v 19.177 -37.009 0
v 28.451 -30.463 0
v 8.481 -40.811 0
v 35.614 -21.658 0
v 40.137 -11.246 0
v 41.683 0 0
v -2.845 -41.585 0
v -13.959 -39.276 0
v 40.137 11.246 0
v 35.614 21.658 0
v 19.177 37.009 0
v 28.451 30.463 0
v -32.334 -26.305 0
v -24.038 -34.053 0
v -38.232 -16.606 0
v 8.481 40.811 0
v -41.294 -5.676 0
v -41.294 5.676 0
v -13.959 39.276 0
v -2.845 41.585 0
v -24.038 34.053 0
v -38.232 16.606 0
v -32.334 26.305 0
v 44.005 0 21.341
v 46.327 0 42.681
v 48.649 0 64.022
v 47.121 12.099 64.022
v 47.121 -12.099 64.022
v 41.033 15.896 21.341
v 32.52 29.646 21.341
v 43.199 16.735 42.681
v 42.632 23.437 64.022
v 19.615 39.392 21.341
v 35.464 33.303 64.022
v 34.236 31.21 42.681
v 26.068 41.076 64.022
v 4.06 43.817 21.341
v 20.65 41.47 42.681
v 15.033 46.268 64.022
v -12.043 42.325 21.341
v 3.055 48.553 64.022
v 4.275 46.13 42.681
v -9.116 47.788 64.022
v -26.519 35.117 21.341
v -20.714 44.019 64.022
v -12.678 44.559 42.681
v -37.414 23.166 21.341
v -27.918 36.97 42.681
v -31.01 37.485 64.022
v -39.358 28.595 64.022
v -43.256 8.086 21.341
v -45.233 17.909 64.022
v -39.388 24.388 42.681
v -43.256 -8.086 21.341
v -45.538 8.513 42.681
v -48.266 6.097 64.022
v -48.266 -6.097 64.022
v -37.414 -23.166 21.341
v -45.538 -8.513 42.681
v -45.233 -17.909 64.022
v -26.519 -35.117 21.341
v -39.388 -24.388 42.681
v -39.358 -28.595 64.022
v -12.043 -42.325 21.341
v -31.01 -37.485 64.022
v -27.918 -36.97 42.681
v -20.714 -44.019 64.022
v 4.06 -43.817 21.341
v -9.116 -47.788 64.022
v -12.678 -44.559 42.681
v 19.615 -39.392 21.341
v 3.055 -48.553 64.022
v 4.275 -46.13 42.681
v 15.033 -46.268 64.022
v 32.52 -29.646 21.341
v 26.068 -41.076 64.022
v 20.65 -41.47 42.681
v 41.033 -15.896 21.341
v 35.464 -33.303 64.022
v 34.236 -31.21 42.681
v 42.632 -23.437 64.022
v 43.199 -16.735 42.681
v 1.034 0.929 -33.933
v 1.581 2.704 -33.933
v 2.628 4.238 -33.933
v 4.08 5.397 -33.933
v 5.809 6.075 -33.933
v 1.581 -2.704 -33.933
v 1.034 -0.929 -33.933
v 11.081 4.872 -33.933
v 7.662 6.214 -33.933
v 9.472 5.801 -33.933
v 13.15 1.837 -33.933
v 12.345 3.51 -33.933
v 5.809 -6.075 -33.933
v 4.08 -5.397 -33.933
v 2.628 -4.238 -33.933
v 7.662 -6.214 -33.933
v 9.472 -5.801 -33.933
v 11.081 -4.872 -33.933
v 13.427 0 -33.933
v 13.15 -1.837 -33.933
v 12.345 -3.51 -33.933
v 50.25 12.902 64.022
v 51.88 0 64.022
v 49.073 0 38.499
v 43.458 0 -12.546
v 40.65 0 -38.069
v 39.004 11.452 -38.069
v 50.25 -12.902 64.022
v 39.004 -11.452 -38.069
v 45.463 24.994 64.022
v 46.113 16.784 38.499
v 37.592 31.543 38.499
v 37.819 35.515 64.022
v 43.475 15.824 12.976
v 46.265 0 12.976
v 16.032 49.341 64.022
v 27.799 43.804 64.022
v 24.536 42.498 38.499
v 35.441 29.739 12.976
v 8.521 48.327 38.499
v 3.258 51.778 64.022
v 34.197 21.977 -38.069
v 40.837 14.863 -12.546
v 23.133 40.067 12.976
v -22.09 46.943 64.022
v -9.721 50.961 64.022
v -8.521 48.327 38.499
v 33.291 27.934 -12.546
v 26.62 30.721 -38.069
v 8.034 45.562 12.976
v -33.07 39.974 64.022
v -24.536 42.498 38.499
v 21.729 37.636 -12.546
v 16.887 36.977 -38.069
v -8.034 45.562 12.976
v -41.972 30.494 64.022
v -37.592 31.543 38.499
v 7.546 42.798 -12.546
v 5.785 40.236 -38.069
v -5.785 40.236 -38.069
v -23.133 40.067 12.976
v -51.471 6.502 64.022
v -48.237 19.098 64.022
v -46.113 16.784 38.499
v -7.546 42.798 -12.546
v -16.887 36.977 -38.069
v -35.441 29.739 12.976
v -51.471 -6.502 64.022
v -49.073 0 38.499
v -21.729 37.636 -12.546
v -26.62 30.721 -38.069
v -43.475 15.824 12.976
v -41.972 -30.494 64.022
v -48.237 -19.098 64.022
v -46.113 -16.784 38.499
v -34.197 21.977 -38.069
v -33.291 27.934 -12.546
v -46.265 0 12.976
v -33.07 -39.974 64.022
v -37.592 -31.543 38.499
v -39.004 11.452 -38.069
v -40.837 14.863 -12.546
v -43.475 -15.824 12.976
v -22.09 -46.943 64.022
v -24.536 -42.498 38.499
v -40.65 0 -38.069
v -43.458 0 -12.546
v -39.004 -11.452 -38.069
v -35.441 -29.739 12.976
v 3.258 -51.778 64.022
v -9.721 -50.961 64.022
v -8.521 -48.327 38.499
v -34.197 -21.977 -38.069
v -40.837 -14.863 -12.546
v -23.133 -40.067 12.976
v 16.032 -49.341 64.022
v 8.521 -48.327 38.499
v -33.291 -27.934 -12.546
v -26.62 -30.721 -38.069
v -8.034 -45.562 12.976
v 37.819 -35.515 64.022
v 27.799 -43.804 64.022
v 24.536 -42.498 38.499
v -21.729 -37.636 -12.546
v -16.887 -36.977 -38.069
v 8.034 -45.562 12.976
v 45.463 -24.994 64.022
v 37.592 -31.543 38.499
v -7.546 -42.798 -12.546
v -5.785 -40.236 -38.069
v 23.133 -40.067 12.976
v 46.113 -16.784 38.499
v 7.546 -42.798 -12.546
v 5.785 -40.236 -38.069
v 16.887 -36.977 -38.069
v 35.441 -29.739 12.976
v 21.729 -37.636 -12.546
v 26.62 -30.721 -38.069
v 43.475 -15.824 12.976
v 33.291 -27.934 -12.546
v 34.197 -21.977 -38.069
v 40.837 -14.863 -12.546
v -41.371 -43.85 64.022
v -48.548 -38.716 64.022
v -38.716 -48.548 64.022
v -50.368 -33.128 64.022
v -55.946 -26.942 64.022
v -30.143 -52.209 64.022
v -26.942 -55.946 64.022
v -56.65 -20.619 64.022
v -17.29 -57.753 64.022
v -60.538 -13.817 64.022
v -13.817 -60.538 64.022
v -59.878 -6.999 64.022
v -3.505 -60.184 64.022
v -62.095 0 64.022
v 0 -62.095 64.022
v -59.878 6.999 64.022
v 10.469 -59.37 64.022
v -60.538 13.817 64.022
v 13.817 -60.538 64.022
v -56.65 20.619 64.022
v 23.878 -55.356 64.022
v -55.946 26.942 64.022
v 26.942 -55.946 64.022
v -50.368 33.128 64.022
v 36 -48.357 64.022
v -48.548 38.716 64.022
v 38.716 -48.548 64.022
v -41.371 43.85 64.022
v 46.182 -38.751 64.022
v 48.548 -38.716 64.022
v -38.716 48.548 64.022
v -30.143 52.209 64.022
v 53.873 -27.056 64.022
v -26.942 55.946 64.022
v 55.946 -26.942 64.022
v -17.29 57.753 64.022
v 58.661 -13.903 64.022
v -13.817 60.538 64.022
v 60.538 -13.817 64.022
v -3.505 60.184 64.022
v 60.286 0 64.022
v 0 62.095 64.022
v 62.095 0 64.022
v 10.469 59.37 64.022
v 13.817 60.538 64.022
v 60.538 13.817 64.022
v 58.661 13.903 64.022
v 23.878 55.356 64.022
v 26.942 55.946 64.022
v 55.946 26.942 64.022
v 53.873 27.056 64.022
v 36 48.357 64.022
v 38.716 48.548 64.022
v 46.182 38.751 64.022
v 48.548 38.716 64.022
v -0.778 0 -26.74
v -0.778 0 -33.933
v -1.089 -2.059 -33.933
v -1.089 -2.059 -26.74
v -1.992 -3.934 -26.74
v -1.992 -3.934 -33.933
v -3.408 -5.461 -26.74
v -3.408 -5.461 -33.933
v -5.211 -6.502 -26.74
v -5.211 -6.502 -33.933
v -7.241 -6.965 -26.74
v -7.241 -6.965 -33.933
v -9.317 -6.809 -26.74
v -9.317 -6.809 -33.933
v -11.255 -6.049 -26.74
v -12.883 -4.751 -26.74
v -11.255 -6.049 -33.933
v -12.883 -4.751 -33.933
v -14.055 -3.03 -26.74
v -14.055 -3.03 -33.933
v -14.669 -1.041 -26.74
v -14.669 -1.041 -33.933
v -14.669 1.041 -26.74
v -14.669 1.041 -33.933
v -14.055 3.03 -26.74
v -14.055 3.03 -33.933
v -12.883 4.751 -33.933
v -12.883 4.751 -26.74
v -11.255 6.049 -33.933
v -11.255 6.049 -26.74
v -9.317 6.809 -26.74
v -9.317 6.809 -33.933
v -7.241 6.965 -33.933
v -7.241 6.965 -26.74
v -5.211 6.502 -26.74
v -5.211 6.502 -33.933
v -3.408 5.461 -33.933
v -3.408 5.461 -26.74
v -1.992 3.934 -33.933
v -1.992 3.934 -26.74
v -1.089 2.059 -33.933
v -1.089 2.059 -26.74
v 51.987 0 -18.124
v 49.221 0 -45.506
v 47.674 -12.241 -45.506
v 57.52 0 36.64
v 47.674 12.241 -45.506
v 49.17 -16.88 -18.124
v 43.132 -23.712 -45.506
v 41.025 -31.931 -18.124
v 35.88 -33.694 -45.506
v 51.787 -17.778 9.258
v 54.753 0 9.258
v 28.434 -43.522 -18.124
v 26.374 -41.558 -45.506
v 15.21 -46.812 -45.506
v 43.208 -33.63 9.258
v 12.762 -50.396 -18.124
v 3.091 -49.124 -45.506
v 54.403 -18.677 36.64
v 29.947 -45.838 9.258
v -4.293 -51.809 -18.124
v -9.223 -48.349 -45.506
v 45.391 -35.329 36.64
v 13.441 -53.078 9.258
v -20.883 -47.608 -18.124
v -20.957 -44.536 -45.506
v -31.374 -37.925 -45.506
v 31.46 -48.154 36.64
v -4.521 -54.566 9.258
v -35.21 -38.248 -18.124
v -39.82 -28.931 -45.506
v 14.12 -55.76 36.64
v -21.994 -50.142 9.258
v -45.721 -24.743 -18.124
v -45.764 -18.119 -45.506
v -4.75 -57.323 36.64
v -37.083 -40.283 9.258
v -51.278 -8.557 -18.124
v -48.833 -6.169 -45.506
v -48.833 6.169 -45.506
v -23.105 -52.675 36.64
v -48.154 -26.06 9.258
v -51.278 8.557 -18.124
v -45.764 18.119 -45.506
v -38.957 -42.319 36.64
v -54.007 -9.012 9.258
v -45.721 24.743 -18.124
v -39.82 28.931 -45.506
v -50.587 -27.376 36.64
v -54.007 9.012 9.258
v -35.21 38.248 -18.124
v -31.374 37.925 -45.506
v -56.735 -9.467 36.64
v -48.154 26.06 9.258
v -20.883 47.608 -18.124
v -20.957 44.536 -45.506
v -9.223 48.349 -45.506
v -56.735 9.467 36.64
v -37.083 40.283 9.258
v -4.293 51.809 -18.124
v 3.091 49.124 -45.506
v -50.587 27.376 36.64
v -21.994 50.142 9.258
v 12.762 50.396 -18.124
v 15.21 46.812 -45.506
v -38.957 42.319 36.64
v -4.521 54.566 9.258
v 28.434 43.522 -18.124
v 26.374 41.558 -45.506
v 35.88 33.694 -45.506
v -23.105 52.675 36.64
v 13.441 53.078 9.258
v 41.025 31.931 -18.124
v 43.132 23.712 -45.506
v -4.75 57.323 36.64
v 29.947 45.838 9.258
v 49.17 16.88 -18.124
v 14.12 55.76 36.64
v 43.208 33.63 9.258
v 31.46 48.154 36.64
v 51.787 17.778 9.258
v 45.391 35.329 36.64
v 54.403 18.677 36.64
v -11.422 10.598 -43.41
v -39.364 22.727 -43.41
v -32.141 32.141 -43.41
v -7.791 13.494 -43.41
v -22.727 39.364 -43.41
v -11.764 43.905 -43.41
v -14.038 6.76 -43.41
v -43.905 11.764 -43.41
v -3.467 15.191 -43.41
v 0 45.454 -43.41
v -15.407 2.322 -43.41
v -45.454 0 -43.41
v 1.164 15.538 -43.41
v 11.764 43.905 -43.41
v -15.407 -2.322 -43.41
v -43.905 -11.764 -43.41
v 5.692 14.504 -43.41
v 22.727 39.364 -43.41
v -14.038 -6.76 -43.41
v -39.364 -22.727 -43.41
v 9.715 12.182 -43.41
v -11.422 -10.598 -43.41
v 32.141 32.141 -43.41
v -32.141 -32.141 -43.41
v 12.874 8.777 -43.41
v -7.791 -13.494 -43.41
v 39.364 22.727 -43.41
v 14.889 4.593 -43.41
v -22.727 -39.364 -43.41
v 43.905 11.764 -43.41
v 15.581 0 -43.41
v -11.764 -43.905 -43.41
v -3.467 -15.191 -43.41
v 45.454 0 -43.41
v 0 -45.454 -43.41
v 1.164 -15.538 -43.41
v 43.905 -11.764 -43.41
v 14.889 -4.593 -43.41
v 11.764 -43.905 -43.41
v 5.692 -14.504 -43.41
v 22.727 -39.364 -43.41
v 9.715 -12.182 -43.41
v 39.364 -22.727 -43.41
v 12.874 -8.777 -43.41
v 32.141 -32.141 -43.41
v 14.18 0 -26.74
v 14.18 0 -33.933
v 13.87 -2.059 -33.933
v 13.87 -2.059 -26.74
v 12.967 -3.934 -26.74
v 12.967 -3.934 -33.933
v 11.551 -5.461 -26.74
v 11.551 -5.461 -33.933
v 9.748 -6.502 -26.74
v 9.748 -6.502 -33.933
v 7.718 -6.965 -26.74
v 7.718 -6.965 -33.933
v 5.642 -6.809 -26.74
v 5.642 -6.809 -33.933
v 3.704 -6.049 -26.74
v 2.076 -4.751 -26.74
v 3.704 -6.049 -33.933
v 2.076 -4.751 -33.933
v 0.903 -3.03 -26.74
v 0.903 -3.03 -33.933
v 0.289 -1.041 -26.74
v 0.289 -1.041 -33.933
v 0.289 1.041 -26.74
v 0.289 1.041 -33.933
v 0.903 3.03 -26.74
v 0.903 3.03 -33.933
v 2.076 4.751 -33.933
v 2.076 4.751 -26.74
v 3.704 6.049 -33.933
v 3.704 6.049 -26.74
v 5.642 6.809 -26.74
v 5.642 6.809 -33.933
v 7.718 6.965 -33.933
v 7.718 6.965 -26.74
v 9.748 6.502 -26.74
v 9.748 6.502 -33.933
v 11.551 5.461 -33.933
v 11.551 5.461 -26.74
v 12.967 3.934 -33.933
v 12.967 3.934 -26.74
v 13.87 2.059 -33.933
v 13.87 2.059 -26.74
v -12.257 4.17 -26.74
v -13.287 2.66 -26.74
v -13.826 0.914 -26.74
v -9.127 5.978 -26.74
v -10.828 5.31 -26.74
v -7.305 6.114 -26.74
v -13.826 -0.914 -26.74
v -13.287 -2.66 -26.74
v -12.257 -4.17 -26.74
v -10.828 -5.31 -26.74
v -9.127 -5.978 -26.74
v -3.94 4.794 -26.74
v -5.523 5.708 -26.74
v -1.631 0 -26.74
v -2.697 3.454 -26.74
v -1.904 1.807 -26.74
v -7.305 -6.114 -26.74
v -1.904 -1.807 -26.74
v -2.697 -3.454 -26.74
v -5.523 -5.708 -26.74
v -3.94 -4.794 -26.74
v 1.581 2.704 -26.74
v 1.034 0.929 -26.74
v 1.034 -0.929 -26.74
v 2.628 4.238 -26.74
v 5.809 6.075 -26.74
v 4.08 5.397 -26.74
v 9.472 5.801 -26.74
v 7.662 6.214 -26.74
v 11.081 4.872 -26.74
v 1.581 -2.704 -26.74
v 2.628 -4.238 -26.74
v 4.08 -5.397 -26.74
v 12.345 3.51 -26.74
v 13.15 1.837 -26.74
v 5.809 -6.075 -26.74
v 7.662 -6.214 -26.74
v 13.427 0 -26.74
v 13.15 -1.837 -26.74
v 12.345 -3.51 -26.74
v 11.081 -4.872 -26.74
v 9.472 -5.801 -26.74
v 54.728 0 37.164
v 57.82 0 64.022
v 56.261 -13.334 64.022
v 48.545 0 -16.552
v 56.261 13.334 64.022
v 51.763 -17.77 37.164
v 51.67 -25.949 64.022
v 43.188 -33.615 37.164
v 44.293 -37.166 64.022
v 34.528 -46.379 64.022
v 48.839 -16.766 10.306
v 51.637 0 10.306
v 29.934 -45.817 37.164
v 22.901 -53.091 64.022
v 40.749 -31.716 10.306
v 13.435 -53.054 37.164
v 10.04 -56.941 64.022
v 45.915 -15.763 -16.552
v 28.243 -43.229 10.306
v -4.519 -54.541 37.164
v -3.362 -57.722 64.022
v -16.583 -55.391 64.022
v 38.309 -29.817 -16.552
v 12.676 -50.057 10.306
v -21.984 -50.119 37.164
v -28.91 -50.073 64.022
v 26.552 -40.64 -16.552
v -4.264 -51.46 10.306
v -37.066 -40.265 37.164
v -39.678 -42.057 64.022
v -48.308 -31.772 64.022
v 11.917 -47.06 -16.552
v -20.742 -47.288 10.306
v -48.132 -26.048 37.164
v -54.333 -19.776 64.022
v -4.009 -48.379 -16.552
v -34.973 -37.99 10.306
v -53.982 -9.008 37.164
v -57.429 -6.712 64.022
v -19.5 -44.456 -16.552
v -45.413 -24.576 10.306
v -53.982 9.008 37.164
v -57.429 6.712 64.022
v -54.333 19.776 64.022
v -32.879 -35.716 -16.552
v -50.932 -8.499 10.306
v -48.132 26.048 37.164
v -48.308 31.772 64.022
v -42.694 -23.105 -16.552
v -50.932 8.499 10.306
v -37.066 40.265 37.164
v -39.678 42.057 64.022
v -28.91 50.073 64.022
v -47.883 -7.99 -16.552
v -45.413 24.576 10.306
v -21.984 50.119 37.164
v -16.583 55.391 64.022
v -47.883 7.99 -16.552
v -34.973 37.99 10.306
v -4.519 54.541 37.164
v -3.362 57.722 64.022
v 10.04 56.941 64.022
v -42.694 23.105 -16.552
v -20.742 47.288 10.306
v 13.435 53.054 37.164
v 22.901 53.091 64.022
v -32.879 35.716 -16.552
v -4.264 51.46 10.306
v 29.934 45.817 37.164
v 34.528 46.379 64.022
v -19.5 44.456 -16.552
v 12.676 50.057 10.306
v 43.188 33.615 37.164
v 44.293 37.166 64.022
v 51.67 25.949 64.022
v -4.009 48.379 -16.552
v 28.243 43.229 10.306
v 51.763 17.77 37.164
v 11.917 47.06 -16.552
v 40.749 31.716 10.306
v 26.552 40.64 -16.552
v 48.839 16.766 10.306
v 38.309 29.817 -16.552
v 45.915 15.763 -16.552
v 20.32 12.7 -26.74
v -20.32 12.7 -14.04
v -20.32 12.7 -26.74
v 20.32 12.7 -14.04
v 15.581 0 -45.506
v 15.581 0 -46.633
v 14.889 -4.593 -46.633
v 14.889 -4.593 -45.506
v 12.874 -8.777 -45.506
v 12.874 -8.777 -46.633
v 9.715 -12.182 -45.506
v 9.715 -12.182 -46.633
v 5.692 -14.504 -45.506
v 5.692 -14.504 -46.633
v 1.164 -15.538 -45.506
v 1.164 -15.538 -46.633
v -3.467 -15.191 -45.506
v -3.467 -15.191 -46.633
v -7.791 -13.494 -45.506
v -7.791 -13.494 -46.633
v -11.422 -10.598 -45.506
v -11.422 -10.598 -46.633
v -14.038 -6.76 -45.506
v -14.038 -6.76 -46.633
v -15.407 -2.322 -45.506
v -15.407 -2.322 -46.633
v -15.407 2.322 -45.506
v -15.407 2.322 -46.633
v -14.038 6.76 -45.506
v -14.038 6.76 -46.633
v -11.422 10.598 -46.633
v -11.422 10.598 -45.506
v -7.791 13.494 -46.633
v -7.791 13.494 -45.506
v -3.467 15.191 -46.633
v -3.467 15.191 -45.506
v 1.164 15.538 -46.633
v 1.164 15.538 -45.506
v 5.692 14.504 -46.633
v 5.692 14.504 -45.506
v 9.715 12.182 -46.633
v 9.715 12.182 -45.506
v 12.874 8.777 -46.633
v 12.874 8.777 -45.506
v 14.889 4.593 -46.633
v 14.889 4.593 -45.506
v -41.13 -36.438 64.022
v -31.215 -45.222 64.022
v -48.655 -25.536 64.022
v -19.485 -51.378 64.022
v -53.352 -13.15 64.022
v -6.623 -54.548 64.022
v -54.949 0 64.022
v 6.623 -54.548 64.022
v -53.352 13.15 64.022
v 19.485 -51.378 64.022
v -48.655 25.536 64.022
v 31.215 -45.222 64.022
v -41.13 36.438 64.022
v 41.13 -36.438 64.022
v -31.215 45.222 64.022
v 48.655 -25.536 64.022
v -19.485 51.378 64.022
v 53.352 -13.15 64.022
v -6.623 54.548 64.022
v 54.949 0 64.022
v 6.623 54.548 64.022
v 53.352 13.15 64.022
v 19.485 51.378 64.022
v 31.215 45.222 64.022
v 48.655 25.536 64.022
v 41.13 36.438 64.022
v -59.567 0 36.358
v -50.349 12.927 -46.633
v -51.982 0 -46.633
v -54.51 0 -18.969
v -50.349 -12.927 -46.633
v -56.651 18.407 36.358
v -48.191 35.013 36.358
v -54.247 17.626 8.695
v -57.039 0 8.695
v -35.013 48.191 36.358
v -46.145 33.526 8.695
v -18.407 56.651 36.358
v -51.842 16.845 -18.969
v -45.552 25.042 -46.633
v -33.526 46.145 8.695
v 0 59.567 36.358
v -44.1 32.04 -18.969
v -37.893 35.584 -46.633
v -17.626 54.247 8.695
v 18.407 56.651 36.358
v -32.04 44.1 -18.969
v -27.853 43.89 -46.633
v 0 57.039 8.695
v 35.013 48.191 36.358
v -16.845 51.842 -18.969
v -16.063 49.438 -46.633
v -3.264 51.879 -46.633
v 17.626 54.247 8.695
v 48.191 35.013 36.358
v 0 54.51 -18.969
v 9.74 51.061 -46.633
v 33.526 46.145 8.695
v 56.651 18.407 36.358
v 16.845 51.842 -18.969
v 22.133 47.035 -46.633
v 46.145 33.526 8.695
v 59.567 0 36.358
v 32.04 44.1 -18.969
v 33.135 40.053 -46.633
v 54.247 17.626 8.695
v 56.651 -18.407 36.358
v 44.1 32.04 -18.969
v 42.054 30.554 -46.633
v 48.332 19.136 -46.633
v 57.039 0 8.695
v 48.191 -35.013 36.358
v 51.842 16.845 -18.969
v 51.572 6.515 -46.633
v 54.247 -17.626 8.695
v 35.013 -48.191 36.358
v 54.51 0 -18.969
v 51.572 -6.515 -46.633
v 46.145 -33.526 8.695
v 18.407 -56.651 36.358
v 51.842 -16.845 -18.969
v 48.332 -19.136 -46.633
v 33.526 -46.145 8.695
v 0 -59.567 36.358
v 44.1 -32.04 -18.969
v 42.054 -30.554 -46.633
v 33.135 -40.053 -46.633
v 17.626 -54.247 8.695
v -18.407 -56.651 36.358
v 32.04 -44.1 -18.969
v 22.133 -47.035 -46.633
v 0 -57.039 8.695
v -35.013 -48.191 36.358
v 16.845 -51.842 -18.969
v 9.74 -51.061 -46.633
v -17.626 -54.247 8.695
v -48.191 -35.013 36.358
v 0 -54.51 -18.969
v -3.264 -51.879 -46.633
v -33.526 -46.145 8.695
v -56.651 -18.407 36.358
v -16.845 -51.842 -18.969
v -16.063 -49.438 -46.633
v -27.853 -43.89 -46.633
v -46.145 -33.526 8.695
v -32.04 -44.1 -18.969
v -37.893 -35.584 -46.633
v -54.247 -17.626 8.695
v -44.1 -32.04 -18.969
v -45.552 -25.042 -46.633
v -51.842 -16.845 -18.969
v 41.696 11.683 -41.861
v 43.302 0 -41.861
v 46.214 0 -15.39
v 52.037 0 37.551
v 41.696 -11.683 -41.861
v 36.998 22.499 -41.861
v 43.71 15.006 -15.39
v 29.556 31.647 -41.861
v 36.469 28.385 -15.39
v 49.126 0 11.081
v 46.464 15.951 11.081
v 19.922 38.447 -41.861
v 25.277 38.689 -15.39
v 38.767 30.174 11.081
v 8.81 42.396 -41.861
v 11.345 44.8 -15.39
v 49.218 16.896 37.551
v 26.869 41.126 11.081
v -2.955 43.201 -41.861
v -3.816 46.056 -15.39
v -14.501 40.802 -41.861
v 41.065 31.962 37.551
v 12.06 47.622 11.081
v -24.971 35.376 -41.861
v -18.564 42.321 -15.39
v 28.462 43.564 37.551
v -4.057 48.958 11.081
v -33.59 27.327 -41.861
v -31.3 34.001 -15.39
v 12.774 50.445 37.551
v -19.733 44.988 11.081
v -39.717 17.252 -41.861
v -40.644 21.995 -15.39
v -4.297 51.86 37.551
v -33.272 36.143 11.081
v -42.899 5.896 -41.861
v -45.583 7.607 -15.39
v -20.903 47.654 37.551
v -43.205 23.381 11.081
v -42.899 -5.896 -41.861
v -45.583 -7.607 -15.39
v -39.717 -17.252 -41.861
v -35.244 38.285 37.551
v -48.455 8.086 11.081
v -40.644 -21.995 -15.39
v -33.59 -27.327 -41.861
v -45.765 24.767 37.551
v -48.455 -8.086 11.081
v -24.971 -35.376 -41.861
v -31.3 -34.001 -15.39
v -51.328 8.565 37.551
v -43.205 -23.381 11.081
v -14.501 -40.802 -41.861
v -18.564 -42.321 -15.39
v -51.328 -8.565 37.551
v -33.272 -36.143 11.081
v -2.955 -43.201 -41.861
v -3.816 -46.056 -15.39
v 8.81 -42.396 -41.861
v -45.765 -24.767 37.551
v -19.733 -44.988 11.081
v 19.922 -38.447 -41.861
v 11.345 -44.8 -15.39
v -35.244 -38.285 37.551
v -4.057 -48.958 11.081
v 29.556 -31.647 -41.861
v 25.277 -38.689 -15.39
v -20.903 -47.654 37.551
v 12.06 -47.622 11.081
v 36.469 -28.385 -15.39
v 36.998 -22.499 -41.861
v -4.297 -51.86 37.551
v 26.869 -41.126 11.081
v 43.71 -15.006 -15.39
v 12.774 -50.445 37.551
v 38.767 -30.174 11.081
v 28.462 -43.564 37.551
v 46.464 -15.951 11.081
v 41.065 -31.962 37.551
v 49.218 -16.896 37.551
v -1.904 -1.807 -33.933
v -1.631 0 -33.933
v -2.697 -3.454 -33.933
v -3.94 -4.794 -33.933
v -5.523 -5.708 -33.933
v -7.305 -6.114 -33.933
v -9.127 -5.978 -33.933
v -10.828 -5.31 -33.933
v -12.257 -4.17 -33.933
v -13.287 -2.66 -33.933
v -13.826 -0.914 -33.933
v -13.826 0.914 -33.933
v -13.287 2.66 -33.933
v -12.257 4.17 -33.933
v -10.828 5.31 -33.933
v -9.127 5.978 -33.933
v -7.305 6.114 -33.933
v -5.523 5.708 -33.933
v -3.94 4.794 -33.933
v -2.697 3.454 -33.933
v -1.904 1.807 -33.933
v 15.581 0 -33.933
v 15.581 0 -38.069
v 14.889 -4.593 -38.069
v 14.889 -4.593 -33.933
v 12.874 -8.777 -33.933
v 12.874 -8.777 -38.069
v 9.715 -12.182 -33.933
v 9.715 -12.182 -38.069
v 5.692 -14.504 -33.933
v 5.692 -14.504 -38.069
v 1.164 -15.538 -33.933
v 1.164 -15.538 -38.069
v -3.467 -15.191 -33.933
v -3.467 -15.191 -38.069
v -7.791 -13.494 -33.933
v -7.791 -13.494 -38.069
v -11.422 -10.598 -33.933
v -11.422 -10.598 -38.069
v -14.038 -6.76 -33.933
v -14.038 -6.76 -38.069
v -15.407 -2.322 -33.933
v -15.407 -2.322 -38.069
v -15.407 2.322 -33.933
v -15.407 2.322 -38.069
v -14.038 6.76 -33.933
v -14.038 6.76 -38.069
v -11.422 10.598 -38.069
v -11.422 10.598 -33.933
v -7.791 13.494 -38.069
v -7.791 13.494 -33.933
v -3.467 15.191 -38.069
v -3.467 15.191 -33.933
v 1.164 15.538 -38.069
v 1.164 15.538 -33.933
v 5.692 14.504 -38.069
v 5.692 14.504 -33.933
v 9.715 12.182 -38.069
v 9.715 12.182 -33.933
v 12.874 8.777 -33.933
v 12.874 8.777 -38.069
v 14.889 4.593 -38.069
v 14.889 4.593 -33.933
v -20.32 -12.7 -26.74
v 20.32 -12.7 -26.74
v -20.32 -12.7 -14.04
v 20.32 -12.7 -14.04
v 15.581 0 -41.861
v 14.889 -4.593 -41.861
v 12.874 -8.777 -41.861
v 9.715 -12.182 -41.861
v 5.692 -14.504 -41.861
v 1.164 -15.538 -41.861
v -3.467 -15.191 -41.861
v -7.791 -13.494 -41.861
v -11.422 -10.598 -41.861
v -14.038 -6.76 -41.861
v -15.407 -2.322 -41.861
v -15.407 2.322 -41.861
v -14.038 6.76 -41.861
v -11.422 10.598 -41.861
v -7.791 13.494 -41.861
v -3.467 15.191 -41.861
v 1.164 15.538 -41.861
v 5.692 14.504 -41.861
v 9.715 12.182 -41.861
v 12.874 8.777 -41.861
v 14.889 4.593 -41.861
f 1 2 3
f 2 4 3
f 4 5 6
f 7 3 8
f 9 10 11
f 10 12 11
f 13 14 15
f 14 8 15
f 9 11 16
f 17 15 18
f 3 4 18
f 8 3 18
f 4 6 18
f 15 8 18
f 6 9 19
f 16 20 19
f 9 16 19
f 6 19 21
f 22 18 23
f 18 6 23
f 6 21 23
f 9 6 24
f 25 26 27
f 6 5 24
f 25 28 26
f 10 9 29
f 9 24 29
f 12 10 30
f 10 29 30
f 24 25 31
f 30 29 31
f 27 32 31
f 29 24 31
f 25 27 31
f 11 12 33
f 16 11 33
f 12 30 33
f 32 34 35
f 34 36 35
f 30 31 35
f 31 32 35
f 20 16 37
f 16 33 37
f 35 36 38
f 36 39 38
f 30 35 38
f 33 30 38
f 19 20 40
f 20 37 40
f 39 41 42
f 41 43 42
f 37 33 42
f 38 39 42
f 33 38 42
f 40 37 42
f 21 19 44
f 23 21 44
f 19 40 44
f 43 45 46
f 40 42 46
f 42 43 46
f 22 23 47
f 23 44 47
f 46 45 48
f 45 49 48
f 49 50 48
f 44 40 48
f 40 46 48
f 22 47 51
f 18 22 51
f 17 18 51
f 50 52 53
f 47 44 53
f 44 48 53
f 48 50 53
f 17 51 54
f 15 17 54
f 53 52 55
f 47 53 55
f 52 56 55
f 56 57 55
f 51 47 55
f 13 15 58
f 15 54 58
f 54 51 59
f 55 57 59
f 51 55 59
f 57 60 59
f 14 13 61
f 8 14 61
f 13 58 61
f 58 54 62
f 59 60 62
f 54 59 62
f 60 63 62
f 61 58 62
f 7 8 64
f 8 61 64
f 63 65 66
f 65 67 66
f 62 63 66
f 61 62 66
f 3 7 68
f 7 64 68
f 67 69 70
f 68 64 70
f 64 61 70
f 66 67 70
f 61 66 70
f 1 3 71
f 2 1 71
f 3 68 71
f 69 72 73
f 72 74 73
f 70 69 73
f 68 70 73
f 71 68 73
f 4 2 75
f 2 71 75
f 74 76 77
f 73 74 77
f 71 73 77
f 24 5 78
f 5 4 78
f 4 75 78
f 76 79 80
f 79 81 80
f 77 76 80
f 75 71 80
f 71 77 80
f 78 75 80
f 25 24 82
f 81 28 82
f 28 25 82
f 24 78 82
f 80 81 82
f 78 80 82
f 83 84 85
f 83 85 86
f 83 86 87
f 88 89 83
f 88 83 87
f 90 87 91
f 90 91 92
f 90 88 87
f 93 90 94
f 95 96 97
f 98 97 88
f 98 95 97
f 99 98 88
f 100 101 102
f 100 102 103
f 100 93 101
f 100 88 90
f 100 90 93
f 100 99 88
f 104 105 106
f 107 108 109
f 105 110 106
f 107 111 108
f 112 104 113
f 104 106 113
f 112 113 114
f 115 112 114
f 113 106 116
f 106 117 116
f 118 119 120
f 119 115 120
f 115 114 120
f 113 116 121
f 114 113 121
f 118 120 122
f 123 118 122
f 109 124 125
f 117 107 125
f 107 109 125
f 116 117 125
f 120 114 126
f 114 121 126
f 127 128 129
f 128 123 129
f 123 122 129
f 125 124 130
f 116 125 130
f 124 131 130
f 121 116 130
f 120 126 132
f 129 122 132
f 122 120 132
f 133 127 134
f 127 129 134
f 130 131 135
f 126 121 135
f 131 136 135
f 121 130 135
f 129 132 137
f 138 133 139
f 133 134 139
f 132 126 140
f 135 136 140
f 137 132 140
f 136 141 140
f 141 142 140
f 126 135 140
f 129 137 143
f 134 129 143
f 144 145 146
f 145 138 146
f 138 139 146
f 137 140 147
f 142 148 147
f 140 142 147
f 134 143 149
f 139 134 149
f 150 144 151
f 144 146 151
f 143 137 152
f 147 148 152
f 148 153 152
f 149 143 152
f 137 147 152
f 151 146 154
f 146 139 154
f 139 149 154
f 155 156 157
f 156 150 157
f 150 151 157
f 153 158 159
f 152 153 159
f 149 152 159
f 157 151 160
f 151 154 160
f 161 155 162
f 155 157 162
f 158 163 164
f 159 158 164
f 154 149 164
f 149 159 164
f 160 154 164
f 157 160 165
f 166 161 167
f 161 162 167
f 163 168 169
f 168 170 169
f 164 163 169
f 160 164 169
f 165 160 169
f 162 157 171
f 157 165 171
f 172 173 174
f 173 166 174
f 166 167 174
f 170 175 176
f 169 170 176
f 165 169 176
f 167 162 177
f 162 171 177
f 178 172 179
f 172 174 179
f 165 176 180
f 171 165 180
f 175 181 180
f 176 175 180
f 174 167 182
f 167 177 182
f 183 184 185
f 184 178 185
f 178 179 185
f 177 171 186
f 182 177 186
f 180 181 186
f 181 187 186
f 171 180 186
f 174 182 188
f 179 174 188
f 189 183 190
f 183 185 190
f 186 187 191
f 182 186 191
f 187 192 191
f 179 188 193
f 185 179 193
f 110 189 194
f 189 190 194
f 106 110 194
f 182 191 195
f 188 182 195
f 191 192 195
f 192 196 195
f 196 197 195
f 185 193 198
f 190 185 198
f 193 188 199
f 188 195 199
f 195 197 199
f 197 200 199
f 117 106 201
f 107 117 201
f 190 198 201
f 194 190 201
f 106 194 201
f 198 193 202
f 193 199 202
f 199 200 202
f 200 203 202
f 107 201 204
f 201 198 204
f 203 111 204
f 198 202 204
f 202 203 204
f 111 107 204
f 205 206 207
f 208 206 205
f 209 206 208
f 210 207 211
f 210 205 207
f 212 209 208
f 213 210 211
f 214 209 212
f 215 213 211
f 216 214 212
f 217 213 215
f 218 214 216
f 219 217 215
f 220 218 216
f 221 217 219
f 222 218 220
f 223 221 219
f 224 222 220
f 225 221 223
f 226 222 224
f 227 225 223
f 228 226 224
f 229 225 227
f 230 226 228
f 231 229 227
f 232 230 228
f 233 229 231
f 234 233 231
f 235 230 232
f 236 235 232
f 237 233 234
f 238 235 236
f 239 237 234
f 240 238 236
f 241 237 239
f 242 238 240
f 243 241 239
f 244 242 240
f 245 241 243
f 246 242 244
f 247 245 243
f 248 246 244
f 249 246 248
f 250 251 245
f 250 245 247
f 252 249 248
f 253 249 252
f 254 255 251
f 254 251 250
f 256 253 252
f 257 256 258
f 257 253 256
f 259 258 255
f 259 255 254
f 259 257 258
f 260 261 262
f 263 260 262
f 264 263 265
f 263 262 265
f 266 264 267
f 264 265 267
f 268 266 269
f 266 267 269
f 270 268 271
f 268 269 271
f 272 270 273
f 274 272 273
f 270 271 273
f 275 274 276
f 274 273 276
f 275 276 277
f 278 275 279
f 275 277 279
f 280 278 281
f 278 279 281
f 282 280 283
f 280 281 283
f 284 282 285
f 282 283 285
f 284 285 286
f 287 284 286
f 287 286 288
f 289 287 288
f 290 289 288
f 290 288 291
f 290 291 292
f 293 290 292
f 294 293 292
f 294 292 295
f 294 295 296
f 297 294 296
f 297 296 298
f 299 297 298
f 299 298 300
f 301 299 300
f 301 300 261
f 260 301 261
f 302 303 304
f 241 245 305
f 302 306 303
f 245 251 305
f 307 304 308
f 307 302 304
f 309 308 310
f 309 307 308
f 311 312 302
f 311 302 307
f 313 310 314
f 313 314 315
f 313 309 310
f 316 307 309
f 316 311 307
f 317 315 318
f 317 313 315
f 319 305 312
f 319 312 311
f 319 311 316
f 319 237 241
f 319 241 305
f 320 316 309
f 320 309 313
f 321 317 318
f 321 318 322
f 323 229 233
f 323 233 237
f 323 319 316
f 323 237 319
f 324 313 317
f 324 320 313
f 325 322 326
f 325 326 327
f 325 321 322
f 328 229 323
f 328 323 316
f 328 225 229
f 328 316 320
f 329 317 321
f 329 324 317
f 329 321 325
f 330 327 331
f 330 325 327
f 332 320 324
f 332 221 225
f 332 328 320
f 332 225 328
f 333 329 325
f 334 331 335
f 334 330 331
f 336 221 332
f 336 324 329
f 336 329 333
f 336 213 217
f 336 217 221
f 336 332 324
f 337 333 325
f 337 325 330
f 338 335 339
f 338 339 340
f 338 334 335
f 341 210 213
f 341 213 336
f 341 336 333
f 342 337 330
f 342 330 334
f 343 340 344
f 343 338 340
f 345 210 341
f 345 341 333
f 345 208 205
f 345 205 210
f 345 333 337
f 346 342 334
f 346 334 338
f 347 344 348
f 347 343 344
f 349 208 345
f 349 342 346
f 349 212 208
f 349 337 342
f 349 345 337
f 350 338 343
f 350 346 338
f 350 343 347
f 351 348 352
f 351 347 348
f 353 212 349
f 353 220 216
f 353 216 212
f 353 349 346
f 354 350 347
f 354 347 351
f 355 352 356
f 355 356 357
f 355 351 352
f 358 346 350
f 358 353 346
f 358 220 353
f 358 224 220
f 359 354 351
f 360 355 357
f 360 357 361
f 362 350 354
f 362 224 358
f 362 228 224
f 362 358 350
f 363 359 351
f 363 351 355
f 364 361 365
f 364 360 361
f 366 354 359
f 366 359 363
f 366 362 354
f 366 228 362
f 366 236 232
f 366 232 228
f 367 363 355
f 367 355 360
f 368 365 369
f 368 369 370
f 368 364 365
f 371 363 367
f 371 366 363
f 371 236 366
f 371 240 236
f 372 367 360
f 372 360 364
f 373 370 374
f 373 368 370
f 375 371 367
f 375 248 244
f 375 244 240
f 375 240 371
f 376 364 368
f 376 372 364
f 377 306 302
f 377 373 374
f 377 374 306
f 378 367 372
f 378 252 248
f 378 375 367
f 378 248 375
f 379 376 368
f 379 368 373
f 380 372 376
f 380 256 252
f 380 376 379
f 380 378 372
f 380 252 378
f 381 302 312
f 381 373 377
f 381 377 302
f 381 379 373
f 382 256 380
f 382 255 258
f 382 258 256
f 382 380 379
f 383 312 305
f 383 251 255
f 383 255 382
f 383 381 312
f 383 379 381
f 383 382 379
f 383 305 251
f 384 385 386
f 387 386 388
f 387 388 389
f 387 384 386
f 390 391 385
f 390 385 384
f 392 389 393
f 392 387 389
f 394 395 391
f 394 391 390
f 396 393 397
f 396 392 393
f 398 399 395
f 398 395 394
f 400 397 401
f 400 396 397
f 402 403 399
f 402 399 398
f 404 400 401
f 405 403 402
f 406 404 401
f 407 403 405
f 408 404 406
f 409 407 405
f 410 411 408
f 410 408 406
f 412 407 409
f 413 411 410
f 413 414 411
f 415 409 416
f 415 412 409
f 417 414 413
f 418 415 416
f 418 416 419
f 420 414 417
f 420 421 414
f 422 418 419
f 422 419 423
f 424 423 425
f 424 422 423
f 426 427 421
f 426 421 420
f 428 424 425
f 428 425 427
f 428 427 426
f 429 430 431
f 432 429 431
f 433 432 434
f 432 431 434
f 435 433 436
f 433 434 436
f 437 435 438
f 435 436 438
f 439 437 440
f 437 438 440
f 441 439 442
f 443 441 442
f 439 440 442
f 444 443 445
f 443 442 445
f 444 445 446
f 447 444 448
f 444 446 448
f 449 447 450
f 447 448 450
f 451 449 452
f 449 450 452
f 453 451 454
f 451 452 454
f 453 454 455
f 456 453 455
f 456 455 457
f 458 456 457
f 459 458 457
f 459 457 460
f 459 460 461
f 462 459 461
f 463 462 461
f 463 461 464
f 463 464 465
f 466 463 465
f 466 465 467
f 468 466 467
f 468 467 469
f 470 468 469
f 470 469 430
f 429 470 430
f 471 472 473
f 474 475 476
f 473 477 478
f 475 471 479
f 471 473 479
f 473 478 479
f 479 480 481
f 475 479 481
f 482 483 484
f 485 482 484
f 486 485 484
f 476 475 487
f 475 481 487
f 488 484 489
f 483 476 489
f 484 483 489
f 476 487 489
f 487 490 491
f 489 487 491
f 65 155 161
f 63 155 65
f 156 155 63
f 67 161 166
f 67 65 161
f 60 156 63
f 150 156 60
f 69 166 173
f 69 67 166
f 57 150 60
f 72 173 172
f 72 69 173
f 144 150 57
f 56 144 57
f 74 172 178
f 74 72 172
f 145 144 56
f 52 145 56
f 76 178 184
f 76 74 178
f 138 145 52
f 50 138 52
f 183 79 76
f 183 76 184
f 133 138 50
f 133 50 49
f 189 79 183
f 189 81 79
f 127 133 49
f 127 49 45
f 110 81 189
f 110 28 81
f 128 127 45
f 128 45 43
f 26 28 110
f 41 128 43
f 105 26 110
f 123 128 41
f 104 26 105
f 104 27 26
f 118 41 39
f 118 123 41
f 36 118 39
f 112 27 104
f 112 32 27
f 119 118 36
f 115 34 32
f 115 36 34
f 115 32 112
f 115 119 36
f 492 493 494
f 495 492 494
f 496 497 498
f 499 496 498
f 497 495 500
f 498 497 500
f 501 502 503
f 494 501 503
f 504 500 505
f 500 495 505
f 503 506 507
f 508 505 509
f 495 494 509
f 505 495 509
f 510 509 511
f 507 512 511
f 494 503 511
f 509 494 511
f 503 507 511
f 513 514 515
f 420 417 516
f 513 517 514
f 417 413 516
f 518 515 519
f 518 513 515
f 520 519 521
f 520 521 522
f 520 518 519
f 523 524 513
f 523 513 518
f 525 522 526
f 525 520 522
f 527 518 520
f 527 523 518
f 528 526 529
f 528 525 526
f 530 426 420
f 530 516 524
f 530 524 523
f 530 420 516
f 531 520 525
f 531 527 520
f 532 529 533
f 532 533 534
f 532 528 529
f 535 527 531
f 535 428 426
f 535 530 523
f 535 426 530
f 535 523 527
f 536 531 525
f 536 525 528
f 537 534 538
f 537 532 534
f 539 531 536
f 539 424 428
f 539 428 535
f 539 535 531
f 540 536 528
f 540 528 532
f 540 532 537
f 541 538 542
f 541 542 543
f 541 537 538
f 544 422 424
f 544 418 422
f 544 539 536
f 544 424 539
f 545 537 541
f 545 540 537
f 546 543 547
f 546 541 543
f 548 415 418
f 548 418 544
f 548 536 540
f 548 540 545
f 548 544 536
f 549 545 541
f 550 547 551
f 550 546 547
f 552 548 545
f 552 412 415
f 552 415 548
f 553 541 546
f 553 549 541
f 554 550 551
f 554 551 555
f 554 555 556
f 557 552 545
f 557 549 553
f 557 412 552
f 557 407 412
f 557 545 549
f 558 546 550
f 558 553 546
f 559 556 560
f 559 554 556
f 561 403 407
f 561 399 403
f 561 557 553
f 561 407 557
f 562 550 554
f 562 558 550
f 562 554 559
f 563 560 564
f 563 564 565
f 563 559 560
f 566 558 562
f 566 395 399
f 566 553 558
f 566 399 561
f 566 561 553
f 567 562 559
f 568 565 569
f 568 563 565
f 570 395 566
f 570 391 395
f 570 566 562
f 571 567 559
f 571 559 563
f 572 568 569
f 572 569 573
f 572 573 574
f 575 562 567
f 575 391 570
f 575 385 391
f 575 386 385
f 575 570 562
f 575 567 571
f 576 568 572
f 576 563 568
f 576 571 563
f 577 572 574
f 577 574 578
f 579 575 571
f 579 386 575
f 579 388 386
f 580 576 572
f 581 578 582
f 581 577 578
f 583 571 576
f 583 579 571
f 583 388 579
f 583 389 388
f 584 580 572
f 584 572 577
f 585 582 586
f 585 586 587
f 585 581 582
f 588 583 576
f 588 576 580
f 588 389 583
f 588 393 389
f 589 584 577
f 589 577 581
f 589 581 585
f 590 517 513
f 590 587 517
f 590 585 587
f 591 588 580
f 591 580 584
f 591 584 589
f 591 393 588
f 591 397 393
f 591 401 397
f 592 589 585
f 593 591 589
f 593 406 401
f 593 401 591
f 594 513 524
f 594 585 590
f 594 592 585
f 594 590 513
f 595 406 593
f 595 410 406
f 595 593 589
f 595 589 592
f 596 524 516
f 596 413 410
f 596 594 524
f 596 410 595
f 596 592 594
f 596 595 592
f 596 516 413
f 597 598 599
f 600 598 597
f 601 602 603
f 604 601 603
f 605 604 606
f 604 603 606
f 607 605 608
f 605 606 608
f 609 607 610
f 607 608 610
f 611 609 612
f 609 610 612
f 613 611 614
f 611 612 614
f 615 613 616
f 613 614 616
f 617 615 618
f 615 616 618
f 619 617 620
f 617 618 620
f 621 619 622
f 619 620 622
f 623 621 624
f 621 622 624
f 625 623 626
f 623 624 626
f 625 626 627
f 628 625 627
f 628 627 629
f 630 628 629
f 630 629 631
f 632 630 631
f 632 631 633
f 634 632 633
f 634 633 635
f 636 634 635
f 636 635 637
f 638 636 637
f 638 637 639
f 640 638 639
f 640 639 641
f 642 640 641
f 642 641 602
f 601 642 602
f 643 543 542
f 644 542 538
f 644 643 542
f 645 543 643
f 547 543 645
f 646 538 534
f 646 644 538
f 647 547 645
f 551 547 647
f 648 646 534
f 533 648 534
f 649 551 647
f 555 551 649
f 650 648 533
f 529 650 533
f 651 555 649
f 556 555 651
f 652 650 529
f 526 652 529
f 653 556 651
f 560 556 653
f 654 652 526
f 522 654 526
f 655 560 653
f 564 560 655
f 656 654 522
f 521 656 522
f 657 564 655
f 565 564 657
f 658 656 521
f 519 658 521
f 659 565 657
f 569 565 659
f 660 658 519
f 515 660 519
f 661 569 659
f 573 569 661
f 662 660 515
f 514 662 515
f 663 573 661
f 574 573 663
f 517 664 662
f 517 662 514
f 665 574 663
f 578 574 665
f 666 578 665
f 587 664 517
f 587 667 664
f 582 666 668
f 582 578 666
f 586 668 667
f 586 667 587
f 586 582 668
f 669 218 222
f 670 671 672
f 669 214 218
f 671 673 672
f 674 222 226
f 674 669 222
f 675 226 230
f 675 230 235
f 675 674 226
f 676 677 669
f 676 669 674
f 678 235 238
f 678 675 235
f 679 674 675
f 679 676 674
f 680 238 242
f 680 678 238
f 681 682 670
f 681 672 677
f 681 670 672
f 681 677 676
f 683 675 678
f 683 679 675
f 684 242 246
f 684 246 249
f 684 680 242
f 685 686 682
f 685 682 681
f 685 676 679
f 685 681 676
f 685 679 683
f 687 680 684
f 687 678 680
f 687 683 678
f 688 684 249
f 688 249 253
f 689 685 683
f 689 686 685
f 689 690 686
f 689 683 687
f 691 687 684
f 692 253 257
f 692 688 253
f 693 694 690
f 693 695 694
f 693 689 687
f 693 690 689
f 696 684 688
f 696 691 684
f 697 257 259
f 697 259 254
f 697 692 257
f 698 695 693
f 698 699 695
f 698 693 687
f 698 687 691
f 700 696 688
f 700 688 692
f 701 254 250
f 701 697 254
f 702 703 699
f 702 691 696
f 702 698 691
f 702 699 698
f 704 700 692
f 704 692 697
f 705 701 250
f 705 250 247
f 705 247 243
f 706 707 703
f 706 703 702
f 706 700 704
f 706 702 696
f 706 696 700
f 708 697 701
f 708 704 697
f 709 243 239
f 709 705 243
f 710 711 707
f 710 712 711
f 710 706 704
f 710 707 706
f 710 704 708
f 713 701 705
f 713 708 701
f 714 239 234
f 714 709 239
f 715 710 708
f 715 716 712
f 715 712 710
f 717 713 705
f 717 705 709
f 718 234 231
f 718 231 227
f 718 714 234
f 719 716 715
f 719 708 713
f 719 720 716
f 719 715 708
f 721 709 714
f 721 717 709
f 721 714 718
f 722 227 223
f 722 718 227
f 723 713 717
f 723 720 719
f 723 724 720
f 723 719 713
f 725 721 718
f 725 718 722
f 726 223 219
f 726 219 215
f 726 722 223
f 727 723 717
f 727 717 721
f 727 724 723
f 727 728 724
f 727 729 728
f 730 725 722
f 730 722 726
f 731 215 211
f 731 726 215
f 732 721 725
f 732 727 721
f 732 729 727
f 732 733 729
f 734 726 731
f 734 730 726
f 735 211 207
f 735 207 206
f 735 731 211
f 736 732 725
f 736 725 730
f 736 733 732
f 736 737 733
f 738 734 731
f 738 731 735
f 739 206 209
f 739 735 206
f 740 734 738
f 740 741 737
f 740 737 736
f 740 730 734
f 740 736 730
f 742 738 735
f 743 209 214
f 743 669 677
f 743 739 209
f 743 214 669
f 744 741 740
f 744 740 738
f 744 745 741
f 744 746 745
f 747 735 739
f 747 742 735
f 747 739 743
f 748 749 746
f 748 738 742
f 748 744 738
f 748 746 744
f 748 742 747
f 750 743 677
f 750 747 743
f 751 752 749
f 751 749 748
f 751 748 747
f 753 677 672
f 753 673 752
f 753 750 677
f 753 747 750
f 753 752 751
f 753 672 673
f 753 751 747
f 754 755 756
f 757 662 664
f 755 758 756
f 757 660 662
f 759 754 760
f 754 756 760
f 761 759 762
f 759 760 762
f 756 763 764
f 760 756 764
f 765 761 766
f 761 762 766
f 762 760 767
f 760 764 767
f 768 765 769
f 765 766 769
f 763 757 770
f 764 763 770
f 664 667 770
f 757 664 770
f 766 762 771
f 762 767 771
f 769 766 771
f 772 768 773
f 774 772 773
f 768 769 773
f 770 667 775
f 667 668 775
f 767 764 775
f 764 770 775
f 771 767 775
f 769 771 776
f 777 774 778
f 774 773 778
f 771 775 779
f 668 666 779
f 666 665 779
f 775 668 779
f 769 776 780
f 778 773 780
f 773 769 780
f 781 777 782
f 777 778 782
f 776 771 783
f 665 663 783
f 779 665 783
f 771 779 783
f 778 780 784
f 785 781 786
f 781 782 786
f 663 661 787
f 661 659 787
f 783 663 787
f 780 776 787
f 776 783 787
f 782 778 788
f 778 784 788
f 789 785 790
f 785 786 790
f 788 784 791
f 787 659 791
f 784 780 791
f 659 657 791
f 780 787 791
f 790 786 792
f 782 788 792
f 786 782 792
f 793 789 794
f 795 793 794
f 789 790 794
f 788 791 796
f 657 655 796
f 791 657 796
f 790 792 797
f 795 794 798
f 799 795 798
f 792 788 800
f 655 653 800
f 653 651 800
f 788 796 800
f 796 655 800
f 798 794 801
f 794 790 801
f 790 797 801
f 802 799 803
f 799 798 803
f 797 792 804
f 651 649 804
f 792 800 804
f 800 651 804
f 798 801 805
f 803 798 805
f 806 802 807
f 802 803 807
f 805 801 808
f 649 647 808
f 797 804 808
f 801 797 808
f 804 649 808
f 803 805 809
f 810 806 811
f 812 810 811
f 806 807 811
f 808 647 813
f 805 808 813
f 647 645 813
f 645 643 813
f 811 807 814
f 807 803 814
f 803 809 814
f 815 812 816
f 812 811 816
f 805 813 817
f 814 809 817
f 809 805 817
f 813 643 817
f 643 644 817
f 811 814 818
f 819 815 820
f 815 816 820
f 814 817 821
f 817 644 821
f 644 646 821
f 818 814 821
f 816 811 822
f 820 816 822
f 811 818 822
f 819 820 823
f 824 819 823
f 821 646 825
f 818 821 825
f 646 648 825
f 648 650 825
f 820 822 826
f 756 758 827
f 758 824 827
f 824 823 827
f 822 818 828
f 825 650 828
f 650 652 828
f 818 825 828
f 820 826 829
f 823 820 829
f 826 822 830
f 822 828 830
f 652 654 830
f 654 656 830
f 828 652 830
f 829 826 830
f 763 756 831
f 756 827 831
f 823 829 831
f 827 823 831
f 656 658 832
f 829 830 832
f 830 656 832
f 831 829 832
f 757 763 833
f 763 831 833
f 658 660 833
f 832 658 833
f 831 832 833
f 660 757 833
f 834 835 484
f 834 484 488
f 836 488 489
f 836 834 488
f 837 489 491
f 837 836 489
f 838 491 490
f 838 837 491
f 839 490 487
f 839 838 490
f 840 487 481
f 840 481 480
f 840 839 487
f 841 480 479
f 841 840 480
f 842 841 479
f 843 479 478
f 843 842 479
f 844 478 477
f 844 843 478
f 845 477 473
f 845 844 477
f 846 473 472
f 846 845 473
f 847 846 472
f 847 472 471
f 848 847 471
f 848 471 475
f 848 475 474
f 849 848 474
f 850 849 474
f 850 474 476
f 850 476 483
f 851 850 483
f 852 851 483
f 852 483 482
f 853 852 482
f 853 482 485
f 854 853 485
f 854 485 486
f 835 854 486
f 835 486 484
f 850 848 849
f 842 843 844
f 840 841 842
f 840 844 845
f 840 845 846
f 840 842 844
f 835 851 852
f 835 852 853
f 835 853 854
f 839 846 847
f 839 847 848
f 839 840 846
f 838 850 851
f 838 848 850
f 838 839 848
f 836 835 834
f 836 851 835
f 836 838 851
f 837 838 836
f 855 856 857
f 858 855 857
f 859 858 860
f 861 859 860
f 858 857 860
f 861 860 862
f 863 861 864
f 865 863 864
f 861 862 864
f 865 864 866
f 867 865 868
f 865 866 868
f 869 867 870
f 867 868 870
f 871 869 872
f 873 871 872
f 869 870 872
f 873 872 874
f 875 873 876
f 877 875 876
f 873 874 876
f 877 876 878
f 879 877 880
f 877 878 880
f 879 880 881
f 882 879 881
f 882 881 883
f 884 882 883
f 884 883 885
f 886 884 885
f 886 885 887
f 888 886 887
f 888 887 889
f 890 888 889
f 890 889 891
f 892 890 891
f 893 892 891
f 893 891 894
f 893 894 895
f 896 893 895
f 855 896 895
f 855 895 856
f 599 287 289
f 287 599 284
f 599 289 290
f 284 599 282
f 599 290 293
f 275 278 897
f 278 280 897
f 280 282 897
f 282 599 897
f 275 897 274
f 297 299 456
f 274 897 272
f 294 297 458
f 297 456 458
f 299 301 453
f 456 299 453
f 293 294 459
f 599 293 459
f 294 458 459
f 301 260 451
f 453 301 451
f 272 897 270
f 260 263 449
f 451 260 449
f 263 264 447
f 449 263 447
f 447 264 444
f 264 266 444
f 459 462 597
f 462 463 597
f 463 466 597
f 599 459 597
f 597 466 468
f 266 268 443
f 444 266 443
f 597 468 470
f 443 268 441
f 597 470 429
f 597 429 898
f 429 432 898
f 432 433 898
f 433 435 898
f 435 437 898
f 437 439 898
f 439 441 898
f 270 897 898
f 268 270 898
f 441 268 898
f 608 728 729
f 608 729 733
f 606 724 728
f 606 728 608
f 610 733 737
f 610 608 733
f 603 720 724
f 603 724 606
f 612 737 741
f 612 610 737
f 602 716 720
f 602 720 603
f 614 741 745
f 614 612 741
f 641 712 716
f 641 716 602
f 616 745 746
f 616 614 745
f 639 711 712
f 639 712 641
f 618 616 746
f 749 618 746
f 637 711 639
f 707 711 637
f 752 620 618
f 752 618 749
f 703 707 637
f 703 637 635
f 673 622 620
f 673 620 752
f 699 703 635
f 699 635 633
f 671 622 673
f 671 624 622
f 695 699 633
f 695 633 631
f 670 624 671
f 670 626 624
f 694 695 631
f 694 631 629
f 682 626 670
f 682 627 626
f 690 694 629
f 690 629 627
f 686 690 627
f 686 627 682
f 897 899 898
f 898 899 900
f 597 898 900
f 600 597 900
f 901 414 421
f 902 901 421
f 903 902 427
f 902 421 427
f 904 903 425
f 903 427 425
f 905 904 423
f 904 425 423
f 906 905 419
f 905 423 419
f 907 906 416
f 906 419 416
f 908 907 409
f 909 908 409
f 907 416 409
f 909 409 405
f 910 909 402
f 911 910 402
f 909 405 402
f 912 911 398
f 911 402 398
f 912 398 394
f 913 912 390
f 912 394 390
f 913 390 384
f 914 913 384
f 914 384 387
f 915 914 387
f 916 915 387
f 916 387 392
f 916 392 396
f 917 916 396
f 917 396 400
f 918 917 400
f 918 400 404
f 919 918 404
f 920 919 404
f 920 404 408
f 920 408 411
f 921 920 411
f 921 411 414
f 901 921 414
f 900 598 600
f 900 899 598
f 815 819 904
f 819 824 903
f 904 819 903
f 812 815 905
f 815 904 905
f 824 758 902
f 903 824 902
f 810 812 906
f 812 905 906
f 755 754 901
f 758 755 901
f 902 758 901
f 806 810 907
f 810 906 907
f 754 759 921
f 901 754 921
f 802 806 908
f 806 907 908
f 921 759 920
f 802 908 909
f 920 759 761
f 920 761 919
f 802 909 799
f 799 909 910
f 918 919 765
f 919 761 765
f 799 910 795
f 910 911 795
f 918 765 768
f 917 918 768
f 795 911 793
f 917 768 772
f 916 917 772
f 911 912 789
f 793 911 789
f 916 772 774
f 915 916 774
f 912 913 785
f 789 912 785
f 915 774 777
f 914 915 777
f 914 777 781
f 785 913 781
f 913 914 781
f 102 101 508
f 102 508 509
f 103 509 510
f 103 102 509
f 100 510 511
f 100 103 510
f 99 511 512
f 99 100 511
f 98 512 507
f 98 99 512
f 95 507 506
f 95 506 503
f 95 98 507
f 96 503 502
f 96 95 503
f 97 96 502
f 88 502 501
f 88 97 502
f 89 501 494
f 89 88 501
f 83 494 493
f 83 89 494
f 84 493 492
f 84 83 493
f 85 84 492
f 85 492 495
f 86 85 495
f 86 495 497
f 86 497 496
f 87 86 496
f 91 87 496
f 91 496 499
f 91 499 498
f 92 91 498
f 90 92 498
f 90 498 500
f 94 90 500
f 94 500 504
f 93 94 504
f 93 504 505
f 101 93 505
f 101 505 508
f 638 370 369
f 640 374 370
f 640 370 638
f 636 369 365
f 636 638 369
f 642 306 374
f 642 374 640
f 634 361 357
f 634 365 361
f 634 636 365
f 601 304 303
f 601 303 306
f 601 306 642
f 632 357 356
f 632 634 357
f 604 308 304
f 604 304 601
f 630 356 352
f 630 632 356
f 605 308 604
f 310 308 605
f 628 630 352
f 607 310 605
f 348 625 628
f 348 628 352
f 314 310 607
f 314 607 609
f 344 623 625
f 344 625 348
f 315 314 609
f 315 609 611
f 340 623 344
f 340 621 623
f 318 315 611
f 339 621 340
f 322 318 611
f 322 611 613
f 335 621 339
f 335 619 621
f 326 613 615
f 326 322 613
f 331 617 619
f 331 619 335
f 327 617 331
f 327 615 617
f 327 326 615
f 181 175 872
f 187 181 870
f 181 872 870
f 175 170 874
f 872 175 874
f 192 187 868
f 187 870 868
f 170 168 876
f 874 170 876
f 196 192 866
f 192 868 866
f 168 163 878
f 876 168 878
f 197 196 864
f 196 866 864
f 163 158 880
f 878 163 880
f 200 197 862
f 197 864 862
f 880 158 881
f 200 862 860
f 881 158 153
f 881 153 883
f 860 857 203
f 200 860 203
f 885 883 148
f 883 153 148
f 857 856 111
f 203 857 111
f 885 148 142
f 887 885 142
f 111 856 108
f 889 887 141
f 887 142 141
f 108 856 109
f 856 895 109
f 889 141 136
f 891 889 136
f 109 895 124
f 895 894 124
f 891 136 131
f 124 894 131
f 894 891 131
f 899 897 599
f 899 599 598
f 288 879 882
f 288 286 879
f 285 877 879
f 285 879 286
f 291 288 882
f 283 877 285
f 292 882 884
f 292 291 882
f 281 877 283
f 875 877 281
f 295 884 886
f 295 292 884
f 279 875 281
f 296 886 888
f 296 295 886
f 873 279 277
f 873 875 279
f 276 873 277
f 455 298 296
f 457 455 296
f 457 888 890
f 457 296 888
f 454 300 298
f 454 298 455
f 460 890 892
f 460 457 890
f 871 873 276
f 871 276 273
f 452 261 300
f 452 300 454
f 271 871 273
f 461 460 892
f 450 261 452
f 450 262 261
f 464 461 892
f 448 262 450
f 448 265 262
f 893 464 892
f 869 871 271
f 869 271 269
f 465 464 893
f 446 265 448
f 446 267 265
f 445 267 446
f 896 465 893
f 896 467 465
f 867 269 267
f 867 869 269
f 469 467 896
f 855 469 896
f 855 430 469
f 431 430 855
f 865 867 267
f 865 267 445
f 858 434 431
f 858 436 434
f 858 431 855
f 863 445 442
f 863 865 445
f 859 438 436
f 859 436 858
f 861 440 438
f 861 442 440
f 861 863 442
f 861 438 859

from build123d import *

# Parameters (mm, degrees)
F3_R      = 15.581224
F4_DEPTH  = 12.7
F5_W      = 40.64
F5_H      = 12.7
F6_DEPTH  = 12.7
F11_R     = 6.984379
F11_R_2   = 6.131356
F11_R_3   = 6.231492
F12_DEPTH = 12.7


with BuildPart() as f1:
    # F0 (on Front) → F1 (revolve)
    with BuildSketch(Plane.XZ):
        Polygon((-62.095214, 64.022034), (-51.98195, -46.63299), (0, -46.63299), (0, 64.022034), align=None)
    revolve(axis=Axis((0, 0, 8.694522), (0, 0, -1)))

    # F3 (on offset) → F4 (cut)
    with BuildSketch(Plane(origin=(0, 0, -46.63299), x_dir=(1, 0, 0), z_dir=(0, 0, -1))):
        Circle(F3_R)
    extrude(amount=-F4_DEPTH, mode=Mode.SUBTRACT)

    # F5 (on Front) → F6 (cut, symmetric)
    with BuildSketch(Plane.XZ):
        with Locations((0, -20.389645)):
            Rectangle(F5_W, F5_H)
    extrude(amount=F6_DEPTH, both=True, mode=Mode.SUBTRACT)

    # F7 (on Front) → F8 (revolve, cut)
    with BuildSketch(Plane.XZ):
        Polygon((49.167432, 68.782791), (0, 68.782791), (0, 0), (41.682635, 0), align=None)
    revolve(axis=Axis((0, 0, 34.391396), (0, 0, 1)), mode=Mode.SUBTRACT)

    # F9 (on Front) → F10 (revolve, cut)
    with BuildSketch(Plane.XZ):
        Polygon((40.650241, -38.069274), (15.356758, -38.069274), (0, -38.069274), (0, -41.860752), (15.356758, -41.860752), (43.30195, -41.860752), (55.038585, 64.83591), (52.006502, 65.169439), align=None)
    revolve(axis=Axis((0, 0, -39.965013), (0, 0, 1)), mode=Mode.SUBTRACT)

    # F11 (on face) → F12 (cut)
    with BuildSketch(Plane(origin=(0, 0, -33.93299), x_dir=(1, 0, 0), z_dir=(0, 0, -1))):
        with Locations((-7.762729, 0)):
            Circle(F11_R)
        with Locations((-7.762729, 0)):
            Circle(F11_R_2, mode=Mode.SUBTRACT)
        with Locations((7.195836, 0)):
            Circle(F11_R)
        with Locations((7.195836, 0)):
            Circle(F11_R_3, mode=Mode.SUBTRACT)
    extrude(amount=-F12_DEPTH, mode=Mode.SUBTRACT)

    # F13 (on Front) → F14 (revolve, cut)
    with BuildSketch(Plane.XZ):
        Polygon((60.373548, 64.889178), (57.893332, 64.660862), (45.453575, -43.409597), (0, -43.409597), (0, -45.505837), (49.22067, -45.505837), align=None)
    revolve(axis=Axis((0, 0, -44.457717), (0, 0, -1)), mode=Mode.SUBTRACT)


solid = f1.part
